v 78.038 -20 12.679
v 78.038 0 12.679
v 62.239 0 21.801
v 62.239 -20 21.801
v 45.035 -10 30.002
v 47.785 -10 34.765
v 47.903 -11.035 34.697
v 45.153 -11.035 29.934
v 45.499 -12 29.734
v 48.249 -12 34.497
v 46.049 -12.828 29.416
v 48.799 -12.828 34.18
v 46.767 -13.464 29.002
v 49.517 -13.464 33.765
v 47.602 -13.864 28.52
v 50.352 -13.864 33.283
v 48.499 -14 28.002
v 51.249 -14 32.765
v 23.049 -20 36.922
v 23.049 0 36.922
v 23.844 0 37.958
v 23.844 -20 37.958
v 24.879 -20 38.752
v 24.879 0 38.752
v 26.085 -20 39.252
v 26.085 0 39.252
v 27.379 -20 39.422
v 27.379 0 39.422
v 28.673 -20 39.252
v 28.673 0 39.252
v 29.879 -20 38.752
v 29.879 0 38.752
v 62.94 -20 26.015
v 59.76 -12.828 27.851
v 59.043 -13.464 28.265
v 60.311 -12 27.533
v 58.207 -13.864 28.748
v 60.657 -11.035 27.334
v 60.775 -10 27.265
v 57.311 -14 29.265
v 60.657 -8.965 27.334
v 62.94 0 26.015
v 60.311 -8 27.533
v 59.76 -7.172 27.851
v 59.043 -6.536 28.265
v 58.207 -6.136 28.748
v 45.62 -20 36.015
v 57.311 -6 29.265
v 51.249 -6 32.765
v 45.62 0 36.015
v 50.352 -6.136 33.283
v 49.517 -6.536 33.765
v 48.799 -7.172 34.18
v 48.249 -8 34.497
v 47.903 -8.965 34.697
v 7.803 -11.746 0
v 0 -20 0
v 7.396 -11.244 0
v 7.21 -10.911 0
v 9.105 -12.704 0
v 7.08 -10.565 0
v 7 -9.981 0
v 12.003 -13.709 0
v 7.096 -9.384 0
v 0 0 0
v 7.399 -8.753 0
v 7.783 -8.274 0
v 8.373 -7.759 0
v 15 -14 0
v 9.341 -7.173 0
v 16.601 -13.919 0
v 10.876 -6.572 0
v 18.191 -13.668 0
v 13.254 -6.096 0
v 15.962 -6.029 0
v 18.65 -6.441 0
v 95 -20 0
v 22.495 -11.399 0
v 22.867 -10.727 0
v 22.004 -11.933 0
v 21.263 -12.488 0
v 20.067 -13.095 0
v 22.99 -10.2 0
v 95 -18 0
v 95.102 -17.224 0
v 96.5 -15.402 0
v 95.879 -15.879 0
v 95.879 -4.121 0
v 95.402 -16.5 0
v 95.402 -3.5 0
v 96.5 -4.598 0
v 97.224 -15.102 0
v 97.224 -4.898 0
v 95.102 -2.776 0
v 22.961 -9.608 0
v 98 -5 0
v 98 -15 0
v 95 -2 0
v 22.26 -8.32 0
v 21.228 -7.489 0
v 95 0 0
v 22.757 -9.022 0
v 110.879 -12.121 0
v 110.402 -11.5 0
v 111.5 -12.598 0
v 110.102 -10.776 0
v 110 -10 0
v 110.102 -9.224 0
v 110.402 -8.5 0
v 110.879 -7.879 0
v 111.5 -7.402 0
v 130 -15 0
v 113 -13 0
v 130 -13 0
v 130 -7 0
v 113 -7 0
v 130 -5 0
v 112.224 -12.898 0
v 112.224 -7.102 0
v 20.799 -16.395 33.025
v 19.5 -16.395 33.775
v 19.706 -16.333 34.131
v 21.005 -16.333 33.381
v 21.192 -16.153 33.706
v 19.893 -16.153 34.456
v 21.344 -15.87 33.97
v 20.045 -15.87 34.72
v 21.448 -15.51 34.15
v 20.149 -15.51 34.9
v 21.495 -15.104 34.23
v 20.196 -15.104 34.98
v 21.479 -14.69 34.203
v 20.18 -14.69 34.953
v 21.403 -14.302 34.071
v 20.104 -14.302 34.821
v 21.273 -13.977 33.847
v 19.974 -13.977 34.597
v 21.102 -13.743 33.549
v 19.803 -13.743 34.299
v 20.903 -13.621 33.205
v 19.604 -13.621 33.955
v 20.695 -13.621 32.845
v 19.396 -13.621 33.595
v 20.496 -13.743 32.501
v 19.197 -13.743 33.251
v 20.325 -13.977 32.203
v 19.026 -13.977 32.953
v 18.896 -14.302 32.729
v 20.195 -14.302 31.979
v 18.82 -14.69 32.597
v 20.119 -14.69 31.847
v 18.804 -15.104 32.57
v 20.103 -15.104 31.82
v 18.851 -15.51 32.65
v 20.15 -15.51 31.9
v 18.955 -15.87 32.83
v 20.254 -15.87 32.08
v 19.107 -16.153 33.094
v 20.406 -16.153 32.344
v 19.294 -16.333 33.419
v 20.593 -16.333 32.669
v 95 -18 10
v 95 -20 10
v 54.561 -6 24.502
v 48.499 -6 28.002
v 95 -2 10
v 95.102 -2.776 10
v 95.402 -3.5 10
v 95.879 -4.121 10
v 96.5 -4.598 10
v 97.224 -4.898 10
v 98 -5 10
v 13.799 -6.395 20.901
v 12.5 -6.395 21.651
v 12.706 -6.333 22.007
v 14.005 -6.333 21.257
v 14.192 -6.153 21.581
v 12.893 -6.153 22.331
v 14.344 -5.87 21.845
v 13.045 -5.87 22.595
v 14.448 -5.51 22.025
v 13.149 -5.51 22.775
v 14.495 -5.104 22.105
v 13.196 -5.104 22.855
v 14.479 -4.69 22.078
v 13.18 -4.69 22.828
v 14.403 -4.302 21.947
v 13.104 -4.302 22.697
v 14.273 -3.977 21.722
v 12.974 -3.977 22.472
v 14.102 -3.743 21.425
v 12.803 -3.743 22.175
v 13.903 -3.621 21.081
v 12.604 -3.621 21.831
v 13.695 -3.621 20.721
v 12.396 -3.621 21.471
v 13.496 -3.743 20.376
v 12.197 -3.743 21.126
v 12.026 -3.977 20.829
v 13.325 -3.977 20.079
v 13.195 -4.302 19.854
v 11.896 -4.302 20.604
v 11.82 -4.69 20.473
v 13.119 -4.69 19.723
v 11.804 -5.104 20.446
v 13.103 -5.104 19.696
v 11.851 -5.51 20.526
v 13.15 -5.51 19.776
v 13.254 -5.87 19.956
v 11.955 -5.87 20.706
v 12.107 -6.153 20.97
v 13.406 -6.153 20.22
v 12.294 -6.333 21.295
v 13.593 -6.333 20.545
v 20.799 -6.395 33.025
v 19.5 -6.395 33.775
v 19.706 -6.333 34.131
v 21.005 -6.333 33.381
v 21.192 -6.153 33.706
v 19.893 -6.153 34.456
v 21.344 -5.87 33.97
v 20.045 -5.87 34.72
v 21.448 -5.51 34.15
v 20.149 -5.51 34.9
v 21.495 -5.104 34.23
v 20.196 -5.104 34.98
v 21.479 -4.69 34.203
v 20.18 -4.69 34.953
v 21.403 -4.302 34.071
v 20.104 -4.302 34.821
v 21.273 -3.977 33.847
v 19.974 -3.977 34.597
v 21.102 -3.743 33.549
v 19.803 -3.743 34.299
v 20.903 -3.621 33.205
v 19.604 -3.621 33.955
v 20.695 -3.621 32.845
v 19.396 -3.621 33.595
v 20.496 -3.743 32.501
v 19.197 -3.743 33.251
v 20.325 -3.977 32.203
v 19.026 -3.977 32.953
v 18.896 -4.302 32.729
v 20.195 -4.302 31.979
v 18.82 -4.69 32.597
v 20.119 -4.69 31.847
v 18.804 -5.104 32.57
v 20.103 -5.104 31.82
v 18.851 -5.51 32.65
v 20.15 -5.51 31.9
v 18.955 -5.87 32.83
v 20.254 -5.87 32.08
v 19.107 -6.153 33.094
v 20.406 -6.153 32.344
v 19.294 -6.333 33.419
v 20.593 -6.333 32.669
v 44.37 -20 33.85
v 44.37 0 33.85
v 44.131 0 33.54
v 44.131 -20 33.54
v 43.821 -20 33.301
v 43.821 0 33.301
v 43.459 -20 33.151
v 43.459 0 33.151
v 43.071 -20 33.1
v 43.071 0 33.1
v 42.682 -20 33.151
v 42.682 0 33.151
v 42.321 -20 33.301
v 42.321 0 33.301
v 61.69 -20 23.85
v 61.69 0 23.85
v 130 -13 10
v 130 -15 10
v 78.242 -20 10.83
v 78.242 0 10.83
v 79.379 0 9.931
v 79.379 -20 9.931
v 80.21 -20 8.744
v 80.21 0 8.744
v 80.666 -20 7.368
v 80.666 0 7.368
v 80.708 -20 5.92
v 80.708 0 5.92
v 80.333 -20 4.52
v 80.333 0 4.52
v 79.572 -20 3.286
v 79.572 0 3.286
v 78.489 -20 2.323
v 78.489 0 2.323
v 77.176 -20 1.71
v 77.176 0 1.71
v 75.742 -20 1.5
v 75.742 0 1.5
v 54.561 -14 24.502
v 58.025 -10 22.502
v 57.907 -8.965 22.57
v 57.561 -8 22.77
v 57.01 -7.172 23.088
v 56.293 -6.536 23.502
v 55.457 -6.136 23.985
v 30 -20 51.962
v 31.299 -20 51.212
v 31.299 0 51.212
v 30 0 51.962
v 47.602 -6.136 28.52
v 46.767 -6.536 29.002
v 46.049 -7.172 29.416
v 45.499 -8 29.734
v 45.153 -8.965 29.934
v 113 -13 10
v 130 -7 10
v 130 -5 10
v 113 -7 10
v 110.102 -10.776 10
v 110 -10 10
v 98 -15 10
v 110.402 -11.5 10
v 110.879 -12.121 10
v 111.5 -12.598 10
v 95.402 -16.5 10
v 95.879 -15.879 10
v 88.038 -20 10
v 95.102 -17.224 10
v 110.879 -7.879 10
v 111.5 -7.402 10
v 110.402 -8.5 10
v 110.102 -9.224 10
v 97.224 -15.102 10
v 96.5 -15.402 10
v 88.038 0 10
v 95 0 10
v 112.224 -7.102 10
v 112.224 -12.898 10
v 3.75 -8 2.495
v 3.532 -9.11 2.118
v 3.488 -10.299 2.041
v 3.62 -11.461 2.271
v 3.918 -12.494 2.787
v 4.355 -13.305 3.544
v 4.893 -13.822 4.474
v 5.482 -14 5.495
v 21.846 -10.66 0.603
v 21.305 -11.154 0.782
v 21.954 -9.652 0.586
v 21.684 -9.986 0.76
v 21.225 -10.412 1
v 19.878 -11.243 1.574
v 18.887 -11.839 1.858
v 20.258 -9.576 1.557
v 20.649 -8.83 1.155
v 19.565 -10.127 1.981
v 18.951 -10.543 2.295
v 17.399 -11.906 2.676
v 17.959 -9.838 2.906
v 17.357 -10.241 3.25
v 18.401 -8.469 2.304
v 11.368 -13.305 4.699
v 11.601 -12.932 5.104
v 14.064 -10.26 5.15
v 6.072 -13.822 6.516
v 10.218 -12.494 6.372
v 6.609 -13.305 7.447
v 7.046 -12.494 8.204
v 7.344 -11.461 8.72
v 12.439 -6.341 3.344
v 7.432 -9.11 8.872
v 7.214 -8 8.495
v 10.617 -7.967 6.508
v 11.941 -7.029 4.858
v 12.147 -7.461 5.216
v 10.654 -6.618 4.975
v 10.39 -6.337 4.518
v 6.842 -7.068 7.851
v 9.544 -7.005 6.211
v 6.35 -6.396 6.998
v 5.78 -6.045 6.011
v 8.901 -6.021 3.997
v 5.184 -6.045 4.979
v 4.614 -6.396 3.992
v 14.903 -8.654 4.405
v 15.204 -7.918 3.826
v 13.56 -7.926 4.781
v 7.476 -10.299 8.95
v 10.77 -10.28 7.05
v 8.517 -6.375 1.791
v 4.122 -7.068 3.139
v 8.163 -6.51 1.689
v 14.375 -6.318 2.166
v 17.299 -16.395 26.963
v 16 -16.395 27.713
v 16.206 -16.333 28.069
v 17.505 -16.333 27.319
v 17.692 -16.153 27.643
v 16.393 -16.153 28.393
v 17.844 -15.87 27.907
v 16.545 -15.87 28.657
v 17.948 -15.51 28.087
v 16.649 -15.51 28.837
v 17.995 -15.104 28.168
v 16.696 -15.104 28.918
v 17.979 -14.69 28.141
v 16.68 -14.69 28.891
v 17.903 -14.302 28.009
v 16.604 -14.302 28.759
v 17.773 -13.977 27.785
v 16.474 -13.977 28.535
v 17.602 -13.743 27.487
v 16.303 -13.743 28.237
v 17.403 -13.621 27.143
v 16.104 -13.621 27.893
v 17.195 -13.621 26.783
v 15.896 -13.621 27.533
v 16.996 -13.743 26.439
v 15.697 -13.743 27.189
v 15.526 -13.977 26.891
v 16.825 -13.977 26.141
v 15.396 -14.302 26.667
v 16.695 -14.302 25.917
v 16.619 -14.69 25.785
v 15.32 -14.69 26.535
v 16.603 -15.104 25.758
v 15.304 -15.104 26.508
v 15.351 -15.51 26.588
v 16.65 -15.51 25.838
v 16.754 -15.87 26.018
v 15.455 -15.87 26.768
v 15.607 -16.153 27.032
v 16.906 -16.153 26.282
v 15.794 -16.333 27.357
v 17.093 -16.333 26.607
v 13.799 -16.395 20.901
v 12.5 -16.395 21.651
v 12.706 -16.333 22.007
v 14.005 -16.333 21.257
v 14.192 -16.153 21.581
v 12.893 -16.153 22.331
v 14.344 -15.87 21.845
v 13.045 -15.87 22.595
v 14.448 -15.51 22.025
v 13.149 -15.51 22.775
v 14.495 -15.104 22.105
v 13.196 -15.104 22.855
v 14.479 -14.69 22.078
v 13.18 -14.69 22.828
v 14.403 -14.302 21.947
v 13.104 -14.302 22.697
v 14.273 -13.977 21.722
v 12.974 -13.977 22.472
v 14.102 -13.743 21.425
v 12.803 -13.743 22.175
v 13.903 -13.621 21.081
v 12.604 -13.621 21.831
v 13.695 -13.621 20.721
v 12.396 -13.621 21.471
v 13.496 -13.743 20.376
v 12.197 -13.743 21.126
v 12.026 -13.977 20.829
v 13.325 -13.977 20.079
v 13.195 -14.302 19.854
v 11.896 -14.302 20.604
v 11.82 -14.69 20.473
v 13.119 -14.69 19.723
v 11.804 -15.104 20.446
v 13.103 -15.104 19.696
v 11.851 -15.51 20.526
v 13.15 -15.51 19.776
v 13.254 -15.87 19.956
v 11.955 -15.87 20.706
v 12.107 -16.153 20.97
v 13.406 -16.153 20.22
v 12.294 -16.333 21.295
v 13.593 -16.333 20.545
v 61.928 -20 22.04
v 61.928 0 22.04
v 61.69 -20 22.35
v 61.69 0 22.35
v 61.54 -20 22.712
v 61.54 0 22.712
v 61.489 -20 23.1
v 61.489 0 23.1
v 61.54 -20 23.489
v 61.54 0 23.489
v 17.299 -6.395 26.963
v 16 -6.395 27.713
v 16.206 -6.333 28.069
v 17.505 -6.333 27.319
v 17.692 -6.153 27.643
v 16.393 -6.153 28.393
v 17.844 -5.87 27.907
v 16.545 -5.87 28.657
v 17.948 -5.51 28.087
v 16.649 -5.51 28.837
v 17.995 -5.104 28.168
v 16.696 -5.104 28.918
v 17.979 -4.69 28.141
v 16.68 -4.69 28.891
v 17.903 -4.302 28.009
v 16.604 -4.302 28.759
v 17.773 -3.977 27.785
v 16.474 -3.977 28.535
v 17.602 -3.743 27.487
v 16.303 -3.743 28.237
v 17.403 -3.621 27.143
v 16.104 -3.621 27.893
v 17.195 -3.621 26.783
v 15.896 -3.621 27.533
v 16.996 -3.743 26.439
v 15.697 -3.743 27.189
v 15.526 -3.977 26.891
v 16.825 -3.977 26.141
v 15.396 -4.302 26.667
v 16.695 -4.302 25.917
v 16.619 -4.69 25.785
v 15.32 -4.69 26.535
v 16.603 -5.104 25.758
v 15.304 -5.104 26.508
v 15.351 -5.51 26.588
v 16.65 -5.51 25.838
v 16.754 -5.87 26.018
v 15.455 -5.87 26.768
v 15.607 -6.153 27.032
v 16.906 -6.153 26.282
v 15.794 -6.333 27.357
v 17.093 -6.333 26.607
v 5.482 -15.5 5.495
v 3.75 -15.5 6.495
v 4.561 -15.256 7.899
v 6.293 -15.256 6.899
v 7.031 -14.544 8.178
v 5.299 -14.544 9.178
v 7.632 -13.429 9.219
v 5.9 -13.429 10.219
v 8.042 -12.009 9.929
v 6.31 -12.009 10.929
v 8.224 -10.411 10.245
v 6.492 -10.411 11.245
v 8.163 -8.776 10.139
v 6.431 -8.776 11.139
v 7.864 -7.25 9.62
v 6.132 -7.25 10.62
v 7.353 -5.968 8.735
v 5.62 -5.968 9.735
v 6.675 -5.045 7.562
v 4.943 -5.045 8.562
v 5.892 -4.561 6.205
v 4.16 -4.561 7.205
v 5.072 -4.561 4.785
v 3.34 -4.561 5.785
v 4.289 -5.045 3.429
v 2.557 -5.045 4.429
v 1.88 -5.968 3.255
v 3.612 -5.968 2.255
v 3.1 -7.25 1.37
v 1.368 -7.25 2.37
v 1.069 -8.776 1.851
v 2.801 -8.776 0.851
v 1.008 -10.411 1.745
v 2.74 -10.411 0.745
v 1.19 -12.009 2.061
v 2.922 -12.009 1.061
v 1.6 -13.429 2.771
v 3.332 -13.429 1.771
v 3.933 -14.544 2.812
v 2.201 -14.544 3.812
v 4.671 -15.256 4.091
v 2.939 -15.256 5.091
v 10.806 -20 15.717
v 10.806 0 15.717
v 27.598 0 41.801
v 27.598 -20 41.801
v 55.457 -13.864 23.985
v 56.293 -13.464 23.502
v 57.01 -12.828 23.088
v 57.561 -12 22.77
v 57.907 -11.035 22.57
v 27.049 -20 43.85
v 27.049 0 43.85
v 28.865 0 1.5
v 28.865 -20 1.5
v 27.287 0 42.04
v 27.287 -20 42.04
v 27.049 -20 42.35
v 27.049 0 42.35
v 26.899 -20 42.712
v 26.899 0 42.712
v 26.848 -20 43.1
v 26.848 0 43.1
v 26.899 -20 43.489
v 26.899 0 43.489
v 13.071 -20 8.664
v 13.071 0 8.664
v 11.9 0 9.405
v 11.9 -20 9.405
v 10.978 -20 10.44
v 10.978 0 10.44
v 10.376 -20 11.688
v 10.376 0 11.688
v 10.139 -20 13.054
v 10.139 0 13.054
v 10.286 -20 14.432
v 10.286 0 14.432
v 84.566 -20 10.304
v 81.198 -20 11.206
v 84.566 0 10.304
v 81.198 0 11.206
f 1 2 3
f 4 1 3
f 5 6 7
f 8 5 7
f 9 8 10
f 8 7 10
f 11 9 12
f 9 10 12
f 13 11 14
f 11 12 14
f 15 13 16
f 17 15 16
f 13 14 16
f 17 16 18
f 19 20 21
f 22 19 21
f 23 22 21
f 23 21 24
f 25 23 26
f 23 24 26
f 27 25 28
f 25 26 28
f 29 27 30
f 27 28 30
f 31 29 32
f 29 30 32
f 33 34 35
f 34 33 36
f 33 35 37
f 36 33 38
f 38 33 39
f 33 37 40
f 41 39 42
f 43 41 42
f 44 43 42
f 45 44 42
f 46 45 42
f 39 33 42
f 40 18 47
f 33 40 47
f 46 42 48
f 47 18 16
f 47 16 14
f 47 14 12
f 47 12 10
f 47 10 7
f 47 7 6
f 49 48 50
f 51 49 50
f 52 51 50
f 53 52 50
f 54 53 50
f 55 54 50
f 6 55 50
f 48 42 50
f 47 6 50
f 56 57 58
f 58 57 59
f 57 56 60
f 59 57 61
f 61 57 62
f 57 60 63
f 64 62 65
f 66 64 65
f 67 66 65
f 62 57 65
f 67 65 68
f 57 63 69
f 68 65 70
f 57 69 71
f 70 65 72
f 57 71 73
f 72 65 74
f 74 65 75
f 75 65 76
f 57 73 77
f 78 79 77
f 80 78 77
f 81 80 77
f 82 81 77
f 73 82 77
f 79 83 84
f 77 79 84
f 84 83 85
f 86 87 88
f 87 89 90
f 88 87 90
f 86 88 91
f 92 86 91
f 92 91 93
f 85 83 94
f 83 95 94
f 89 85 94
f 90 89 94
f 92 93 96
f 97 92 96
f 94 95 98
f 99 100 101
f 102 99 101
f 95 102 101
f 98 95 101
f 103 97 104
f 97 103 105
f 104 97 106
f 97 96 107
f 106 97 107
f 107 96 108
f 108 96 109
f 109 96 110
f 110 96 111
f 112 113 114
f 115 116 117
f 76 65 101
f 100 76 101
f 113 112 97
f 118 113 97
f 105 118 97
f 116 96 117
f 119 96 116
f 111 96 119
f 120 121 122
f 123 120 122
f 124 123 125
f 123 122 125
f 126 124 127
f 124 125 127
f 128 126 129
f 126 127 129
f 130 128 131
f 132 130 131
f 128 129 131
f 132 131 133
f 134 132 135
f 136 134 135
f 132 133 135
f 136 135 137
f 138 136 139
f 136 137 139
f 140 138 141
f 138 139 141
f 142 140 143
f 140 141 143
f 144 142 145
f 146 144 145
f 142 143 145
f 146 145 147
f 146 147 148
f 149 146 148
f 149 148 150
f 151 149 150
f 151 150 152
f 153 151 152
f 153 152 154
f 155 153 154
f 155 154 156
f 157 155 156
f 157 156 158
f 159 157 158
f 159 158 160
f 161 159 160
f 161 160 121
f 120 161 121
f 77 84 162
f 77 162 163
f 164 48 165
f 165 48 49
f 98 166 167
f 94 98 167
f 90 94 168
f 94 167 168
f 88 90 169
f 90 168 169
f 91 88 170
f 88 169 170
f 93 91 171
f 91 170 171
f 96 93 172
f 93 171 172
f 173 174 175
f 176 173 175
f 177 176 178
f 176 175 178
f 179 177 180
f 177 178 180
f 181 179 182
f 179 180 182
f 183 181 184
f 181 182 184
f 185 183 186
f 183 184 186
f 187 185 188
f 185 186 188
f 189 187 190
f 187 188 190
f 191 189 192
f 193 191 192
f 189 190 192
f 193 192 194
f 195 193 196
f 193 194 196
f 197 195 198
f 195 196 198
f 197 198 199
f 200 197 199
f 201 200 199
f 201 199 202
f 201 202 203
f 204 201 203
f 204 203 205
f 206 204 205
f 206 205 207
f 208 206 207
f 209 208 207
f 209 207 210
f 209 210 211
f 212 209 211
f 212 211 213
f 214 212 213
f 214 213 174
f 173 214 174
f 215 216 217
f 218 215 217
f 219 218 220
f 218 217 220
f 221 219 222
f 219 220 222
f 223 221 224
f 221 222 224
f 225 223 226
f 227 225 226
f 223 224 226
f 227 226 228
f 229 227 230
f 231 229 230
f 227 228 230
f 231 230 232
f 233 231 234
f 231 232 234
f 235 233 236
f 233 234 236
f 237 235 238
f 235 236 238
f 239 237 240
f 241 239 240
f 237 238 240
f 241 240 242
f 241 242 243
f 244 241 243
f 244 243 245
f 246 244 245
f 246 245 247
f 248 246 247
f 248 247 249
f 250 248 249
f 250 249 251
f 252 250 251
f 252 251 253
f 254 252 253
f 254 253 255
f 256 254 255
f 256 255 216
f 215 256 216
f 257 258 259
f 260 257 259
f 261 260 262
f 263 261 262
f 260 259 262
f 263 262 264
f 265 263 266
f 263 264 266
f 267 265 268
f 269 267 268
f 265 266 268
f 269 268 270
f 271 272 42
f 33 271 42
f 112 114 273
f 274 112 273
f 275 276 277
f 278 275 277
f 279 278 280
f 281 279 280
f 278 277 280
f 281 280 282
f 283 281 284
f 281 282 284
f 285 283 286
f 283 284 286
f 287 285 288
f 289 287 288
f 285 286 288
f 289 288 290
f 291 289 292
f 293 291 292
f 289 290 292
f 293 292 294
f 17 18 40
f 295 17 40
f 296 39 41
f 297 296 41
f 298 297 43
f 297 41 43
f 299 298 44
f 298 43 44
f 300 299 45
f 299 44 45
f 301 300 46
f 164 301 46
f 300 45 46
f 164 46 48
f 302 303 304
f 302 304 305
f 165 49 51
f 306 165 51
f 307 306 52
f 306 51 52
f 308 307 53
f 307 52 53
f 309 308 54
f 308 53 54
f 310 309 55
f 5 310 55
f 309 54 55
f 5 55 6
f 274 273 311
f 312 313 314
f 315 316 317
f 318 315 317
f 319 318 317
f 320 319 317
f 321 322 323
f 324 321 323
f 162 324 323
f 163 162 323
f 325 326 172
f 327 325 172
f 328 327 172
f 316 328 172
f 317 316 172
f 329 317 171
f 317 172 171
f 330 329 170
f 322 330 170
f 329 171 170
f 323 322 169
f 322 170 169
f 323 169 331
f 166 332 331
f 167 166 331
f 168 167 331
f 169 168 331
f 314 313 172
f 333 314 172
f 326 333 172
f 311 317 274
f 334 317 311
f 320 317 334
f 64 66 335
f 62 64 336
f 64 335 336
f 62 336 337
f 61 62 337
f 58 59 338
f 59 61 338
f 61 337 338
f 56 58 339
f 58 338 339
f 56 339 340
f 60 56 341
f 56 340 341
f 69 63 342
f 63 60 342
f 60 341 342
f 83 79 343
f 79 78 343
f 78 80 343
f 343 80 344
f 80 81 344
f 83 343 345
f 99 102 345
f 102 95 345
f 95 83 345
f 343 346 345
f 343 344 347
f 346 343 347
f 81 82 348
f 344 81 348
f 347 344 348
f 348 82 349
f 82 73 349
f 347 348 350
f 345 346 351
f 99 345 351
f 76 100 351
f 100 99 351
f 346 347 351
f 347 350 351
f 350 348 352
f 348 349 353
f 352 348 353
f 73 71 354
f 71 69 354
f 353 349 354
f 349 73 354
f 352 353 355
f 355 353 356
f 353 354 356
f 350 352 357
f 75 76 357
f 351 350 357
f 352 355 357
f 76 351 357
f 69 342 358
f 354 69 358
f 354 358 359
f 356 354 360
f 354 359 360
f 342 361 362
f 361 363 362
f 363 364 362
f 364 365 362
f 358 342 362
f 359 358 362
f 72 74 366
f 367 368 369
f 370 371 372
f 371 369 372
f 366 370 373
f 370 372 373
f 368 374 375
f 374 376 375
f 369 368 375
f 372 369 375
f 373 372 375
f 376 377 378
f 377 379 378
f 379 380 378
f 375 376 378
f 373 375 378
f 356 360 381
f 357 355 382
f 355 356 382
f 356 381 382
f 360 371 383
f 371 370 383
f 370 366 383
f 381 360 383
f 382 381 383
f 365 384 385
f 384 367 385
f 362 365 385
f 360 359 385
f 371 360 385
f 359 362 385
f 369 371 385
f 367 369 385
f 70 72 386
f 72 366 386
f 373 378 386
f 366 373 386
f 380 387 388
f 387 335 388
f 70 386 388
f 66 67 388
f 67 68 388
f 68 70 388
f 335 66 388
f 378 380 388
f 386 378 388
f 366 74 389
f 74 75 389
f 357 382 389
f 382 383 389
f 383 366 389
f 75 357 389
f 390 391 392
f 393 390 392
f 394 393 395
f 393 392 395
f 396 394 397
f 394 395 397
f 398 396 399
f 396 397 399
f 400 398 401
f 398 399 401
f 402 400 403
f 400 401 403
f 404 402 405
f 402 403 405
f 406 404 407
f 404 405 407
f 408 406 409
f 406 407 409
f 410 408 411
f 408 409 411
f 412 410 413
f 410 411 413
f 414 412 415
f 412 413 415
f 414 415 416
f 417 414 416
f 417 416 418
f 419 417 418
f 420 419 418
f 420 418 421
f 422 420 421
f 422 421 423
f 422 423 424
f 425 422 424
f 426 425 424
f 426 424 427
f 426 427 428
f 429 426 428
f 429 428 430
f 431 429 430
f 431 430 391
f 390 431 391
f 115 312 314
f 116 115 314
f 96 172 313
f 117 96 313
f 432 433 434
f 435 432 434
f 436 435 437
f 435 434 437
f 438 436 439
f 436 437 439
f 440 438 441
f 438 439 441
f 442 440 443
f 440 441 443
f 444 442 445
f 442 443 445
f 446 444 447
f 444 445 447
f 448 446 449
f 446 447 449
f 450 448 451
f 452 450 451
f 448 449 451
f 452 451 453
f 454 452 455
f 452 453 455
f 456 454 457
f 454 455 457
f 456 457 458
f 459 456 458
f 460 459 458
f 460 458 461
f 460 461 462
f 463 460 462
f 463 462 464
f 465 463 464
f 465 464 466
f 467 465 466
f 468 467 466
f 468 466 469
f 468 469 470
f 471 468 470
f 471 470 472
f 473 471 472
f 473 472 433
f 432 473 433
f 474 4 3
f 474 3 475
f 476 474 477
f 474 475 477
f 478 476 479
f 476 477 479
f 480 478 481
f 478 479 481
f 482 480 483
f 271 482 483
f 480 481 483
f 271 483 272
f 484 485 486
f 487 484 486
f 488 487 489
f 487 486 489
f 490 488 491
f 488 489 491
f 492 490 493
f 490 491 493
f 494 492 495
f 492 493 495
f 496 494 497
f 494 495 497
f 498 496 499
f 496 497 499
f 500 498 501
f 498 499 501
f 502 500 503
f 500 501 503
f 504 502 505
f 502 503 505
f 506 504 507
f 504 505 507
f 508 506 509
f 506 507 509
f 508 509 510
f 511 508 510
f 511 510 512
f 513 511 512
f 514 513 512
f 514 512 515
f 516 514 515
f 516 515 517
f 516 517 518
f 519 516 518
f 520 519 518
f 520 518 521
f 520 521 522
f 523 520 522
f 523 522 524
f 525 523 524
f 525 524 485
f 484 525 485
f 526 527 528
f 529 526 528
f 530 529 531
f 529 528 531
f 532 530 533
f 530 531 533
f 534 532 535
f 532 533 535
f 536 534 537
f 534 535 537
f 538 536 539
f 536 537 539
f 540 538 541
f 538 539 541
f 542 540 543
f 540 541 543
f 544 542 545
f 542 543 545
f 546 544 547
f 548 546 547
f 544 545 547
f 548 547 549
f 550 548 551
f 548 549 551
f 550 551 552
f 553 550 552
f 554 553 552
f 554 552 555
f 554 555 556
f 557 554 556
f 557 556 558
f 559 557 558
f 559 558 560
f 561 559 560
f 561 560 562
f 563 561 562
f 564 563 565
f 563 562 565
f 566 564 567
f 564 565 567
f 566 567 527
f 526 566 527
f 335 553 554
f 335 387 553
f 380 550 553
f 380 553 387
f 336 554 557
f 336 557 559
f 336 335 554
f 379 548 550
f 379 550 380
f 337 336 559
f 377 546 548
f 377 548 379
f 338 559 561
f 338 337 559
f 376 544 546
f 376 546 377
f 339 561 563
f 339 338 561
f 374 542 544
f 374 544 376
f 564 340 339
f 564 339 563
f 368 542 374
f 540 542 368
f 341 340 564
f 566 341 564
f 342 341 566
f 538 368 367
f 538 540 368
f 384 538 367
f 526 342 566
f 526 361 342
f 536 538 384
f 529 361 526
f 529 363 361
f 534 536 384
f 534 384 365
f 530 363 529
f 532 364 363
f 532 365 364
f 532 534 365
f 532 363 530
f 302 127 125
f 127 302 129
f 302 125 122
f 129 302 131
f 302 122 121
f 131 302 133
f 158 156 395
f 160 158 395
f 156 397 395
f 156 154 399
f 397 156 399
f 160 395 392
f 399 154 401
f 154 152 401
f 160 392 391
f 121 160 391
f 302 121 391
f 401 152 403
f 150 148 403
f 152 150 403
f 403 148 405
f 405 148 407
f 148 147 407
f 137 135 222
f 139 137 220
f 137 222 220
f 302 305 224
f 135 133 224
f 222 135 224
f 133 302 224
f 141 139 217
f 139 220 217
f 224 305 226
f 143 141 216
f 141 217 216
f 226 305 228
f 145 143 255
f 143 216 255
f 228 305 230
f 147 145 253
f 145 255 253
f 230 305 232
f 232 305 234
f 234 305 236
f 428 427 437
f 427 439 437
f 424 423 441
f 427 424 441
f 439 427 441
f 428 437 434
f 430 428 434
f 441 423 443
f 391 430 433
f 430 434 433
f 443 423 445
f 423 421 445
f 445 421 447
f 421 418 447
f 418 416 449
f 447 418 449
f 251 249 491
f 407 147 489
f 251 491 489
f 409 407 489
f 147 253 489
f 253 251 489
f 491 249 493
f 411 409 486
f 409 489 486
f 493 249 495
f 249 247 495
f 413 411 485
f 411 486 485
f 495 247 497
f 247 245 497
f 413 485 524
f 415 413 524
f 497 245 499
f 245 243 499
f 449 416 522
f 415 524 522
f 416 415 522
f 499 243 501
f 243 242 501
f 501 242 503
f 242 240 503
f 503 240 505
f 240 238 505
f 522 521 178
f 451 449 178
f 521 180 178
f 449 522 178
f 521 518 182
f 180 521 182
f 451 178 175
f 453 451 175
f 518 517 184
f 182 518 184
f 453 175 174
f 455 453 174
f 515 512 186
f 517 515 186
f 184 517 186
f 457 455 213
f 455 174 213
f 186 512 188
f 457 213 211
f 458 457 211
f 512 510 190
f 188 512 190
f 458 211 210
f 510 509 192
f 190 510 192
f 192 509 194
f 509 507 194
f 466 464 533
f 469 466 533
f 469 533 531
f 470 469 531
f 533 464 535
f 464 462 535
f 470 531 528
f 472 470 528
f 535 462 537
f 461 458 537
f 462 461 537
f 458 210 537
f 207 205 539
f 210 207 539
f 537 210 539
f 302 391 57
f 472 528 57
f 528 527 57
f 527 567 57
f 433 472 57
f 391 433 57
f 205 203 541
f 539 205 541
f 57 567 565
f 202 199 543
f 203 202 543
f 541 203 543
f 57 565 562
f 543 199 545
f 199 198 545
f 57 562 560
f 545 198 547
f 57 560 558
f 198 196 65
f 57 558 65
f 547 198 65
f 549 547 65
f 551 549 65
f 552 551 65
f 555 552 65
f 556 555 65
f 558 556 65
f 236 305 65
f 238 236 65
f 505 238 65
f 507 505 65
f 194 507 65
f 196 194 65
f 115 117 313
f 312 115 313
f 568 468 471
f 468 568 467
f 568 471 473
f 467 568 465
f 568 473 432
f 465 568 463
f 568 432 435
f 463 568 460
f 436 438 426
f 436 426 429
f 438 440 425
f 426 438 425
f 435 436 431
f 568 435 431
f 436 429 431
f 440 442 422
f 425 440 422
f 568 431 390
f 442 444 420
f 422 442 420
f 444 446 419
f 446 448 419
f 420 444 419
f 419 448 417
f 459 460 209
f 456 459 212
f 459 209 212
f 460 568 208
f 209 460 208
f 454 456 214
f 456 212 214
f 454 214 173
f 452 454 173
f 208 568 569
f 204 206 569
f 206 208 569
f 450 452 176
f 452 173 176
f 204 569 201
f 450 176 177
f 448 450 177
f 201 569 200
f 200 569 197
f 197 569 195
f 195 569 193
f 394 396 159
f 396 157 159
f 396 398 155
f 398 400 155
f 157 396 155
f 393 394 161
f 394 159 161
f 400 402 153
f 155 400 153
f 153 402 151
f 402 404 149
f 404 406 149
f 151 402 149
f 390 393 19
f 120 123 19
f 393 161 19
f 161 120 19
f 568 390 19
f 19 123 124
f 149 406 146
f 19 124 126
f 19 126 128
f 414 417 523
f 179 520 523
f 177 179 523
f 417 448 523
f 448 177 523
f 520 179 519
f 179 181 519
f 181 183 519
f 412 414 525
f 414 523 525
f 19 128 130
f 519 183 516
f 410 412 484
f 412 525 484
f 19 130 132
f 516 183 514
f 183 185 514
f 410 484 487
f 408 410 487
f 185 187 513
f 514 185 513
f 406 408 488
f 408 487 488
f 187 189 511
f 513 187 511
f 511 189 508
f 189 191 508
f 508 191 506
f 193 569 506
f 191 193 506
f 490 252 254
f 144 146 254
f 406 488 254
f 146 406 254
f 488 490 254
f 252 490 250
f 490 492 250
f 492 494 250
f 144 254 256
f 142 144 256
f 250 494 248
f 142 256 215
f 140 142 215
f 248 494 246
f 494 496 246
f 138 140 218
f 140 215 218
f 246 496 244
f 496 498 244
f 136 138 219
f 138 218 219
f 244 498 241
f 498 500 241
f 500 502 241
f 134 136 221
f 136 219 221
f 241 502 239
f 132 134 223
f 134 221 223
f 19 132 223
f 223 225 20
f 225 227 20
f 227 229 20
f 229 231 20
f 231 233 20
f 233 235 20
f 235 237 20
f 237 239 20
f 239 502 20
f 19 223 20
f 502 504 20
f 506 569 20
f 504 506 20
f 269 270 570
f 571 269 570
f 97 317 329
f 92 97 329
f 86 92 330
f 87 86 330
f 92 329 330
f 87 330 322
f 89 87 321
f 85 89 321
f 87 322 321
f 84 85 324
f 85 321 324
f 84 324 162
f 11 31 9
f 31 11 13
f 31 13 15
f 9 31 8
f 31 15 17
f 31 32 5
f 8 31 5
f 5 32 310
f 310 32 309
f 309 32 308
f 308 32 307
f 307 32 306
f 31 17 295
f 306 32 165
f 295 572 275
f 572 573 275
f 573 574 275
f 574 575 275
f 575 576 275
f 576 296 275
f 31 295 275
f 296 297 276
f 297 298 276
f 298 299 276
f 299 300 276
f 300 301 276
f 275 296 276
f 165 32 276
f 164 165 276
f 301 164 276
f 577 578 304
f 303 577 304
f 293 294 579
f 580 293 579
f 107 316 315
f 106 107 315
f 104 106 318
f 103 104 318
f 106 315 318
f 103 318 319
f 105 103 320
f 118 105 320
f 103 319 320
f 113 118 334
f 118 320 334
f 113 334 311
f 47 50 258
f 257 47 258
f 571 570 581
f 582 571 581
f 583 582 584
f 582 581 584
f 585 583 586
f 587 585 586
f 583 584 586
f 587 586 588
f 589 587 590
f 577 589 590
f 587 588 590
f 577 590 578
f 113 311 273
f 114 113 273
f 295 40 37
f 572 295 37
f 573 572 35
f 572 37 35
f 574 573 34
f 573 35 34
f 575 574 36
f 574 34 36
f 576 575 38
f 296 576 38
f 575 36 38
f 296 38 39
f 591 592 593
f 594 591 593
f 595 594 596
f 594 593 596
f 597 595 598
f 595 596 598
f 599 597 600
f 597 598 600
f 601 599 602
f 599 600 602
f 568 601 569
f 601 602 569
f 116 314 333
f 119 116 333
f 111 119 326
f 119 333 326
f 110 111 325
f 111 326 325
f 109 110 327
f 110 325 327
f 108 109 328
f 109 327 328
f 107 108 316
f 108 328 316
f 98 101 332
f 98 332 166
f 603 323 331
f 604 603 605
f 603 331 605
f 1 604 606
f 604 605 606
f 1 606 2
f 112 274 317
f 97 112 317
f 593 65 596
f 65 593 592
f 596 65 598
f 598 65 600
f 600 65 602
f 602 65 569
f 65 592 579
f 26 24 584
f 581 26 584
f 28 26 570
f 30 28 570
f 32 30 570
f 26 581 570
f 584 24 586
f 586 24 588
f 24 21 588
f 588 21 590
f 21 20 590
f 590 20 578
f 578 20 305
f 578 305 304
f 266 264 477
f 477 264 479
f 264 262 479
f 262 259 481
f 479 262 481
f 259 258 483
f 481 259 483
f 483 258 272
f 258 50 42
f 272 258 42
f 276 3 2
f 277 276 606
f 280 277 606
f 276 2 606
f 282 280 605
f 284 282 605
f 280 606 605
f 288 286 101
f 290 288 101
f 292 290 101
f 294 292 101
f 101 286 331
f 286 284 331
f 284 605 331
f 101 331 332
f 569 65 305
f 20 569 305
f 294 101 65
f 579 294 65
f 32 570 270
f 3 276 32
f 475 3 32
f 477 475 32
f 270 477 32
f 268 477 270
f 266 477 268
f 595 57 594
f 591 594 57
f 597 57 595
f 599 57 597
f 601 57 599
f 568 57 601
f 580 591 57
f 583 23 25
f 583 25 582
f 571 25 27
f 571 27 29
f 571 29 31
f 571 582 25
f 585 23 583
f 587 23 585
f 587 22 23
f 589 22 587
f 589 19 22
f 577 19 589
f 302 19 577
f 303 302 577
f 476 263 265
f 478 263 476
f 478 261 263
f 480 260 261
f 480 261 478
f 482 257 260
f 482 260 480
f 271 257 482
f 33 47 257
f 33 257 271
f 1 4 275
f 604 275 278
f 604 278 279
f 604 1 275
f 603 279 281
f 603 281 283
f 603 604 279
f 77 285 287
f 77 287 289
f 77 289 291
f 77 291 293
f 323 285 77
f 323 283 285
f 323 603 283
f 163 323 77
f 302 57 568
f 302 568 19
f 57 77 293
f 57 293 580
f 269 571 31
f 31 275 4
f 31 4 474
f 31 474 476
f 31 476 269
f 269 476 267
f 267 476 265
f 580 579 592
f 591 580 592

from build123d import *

# Parameters (mm, degrees)
F1_DEPTH = 20
F2_R     = 5.5
F2_R_2   = 4
F2_R_3   = 1.395
F3_DEPTH = 2
F4_DEPTH = 112.584302492
F6_DEPTH = 10.001
F8_DEPTH = 5.5


with BuildPart() as f1:
    # F0 (on Front) → F1 (new body)
    with BuildSketch(Plane.XZ):
        with BuildLine():
            Line((30, 51.9615242271), (0, 0))
            Line((0, 0), (130, 0))
            Line((130, 0), (130, 10))
            Line((130, 10), (88.0384757729, 10))
            ThreePointArc((88.0384757729, 10), (82.8620948709, 10.6814834742), (78.0384757729, 12.6794919243))
            Line((78.0384757729, 12.6794919243), (62.2390923627, 21.8012701892))
            ThreePointArc((62.2390923627, 21.8012701892), (61.5402036233, 22.7120797272), (61.6900542571, 23.8503082949))
            Line((61.6900542571, 23.8503082949), (62.9400542571, 26.0153718044))
            Line((62.9400542571, 26.0153718044), (45.6195461814, 36.0153718044))
            Line((45.6195461814, 36.0153718044), (44.3695461814, 33.8503082949))
            ThreePointArc((44.3695461814, 33.8503082949), (43.4587366433, 33.1514195555), (42.3205080757, 33.3012701892))
            Line((42.3205080757, 33.3012701892), (27.5980762114, 41.8012701892))
            ThreePointArc((27.5980762114, 41.8012701892), (26.8991874719, 42.7120797272), (27.0490381057, 43.8503082949))
            Line((27.0490381057, 43.8503082949), (31.2990381057, 51.2115242271))
            Line((31.2990381057, 51.2115242271), (30, 51.9615242271))
        make_face()
        with BuildLine():
            ThreePointArc((13.0711054025, 8.6635187293), (10.3758012826, 11.6884456075), (10.8062850623, 15.7170347689))
            Line((10.8062850623, 15.7170347689), (23.0490381057, 36.9221050646))
            ThreePointArc((23.0490381057, 36.9221050646), (26.0850698991, 39.2517341961), (29.8791651246, 38.7522320835))
            Line((29.8791651246, 38.7522320835), (78.2416697508, 10.8301270189))
            ThreePointArc((78.2416697508, 10.8301270189), (80.5712988822, 5.2059047745), (75.7416697508, 1.5))
            Line((75.7416697508, 1.5), (28.8649813291, 1.5))
            Line((28.8649813291, 1.5), (13.0711054025, 8.6635187293))
        make_face(mode=Mode.SUBTRACT)
    extrude(amount=F1_DEPTH)

    # F2 (on face) → F3 (cut)
    with BuildSketch(Plane(origin=(0, 0, 0), x_dir=(0, -1, 0), z_dir=(-0.8660254038, 0, 0.5))):
        with Locations((10, 7.5)):
            Circle(F2_R)
        with Locations((10, 7.5)):
            Circle(F2_R_2, mode=Mode.SUBTRACT)
        with Locations((5, 25)):
            Circle(F2_R_3)
        with Locations((15, 25)):
            Circle(F2_R_3)
        with Locations((15, 32)):
            Circle(F2_R_3)
        with Locations((15, 39)):
            Circle(F2_R_3)
        with Locations((5, 39)):
            Circle(F2_R_3)
        with Locations((5, 32)):
            Circle(F2_R_3)
    extrude(amount=-F3_DEPTH, mode=Mode.SUBTRACT)

    # F4 (cut, through all): a face of the model
    f4_faces = [f1.faces().sort_by_distance(p)[0] for p in [
        (3.75, -10, 6.4951905284),
    ]]
    extrude(f4_faces, amount=-F4_DEPTH, mode=Mode.SUBTRACT)

    # F5 (on face) → F6 (cut, through all)
    with BuildSketch(Plane.XY.offset(10)):
        with BuildLine():
            Line((130, -13), (130, -10))
            Line((130, -10), (130, -7))
            Line((130, -7), (113, -7))
            ThreePointArc((113, -7), (110.8786796564, -7.8786796564), (110, -10))
            ThreePointArc((110, -10), (110.8786796564, -12.1213203436), (113, -13))
            Line((113, -13), (130, -13))
        make_face()
        with BuildLine():
            Line((130, -20), (130, -15))
            Line((130, -15), (98, -15))
            ThreePointArc((98, -15), (95.8786796564, -15.8786796564), (95, -18))
            Line((95, -18), (95, -20))
            Line((95, -20), (130, -20))
        make_face()
        with BuildLine():
            Line((98, -5), (130, -5))
            Line((130, -5), (130, 0))
            Line((130, 0), (95, 0))
            Line((95, 0), (95, -2))
            ThreePointArc((95, -2), (95.8786796564, -4.1213203436), (98, -5))
        make_face()
    extrude(amount=-F6_DEPTH, mode=Mode.SUBTRACT)

    # F7 (on face) → F8 (cut, through all)
    with BuildSketch(Plane(origin=(27, 0, 46.7653718044), x_dir=(0.8660254038, 0, -0.5), z_dir=(0.5, 0, 0.8660254038))):
        with BuildLine():
            Line((35, -6), (28, -6))
            ThreePointArc((28, -6), (25.1715728753, -7.1715728753), (24, -10))
            ThreePointArc((24, -10), (25.1715728753, -12.8284271247), (28, -14))
            Line((28, -14), (35, -14))
            ThreePointArc((35, -14), (37.8284271247, -12.8284271247), (39, -10))
            ThreePointArc((39, -10), (37.8284271247, -7.1715728753), (35, -6))
        make_face()
    extrude(amount=-F8_DEPTH, mode=Mode.SUBTRACT)


solid = f1.part
